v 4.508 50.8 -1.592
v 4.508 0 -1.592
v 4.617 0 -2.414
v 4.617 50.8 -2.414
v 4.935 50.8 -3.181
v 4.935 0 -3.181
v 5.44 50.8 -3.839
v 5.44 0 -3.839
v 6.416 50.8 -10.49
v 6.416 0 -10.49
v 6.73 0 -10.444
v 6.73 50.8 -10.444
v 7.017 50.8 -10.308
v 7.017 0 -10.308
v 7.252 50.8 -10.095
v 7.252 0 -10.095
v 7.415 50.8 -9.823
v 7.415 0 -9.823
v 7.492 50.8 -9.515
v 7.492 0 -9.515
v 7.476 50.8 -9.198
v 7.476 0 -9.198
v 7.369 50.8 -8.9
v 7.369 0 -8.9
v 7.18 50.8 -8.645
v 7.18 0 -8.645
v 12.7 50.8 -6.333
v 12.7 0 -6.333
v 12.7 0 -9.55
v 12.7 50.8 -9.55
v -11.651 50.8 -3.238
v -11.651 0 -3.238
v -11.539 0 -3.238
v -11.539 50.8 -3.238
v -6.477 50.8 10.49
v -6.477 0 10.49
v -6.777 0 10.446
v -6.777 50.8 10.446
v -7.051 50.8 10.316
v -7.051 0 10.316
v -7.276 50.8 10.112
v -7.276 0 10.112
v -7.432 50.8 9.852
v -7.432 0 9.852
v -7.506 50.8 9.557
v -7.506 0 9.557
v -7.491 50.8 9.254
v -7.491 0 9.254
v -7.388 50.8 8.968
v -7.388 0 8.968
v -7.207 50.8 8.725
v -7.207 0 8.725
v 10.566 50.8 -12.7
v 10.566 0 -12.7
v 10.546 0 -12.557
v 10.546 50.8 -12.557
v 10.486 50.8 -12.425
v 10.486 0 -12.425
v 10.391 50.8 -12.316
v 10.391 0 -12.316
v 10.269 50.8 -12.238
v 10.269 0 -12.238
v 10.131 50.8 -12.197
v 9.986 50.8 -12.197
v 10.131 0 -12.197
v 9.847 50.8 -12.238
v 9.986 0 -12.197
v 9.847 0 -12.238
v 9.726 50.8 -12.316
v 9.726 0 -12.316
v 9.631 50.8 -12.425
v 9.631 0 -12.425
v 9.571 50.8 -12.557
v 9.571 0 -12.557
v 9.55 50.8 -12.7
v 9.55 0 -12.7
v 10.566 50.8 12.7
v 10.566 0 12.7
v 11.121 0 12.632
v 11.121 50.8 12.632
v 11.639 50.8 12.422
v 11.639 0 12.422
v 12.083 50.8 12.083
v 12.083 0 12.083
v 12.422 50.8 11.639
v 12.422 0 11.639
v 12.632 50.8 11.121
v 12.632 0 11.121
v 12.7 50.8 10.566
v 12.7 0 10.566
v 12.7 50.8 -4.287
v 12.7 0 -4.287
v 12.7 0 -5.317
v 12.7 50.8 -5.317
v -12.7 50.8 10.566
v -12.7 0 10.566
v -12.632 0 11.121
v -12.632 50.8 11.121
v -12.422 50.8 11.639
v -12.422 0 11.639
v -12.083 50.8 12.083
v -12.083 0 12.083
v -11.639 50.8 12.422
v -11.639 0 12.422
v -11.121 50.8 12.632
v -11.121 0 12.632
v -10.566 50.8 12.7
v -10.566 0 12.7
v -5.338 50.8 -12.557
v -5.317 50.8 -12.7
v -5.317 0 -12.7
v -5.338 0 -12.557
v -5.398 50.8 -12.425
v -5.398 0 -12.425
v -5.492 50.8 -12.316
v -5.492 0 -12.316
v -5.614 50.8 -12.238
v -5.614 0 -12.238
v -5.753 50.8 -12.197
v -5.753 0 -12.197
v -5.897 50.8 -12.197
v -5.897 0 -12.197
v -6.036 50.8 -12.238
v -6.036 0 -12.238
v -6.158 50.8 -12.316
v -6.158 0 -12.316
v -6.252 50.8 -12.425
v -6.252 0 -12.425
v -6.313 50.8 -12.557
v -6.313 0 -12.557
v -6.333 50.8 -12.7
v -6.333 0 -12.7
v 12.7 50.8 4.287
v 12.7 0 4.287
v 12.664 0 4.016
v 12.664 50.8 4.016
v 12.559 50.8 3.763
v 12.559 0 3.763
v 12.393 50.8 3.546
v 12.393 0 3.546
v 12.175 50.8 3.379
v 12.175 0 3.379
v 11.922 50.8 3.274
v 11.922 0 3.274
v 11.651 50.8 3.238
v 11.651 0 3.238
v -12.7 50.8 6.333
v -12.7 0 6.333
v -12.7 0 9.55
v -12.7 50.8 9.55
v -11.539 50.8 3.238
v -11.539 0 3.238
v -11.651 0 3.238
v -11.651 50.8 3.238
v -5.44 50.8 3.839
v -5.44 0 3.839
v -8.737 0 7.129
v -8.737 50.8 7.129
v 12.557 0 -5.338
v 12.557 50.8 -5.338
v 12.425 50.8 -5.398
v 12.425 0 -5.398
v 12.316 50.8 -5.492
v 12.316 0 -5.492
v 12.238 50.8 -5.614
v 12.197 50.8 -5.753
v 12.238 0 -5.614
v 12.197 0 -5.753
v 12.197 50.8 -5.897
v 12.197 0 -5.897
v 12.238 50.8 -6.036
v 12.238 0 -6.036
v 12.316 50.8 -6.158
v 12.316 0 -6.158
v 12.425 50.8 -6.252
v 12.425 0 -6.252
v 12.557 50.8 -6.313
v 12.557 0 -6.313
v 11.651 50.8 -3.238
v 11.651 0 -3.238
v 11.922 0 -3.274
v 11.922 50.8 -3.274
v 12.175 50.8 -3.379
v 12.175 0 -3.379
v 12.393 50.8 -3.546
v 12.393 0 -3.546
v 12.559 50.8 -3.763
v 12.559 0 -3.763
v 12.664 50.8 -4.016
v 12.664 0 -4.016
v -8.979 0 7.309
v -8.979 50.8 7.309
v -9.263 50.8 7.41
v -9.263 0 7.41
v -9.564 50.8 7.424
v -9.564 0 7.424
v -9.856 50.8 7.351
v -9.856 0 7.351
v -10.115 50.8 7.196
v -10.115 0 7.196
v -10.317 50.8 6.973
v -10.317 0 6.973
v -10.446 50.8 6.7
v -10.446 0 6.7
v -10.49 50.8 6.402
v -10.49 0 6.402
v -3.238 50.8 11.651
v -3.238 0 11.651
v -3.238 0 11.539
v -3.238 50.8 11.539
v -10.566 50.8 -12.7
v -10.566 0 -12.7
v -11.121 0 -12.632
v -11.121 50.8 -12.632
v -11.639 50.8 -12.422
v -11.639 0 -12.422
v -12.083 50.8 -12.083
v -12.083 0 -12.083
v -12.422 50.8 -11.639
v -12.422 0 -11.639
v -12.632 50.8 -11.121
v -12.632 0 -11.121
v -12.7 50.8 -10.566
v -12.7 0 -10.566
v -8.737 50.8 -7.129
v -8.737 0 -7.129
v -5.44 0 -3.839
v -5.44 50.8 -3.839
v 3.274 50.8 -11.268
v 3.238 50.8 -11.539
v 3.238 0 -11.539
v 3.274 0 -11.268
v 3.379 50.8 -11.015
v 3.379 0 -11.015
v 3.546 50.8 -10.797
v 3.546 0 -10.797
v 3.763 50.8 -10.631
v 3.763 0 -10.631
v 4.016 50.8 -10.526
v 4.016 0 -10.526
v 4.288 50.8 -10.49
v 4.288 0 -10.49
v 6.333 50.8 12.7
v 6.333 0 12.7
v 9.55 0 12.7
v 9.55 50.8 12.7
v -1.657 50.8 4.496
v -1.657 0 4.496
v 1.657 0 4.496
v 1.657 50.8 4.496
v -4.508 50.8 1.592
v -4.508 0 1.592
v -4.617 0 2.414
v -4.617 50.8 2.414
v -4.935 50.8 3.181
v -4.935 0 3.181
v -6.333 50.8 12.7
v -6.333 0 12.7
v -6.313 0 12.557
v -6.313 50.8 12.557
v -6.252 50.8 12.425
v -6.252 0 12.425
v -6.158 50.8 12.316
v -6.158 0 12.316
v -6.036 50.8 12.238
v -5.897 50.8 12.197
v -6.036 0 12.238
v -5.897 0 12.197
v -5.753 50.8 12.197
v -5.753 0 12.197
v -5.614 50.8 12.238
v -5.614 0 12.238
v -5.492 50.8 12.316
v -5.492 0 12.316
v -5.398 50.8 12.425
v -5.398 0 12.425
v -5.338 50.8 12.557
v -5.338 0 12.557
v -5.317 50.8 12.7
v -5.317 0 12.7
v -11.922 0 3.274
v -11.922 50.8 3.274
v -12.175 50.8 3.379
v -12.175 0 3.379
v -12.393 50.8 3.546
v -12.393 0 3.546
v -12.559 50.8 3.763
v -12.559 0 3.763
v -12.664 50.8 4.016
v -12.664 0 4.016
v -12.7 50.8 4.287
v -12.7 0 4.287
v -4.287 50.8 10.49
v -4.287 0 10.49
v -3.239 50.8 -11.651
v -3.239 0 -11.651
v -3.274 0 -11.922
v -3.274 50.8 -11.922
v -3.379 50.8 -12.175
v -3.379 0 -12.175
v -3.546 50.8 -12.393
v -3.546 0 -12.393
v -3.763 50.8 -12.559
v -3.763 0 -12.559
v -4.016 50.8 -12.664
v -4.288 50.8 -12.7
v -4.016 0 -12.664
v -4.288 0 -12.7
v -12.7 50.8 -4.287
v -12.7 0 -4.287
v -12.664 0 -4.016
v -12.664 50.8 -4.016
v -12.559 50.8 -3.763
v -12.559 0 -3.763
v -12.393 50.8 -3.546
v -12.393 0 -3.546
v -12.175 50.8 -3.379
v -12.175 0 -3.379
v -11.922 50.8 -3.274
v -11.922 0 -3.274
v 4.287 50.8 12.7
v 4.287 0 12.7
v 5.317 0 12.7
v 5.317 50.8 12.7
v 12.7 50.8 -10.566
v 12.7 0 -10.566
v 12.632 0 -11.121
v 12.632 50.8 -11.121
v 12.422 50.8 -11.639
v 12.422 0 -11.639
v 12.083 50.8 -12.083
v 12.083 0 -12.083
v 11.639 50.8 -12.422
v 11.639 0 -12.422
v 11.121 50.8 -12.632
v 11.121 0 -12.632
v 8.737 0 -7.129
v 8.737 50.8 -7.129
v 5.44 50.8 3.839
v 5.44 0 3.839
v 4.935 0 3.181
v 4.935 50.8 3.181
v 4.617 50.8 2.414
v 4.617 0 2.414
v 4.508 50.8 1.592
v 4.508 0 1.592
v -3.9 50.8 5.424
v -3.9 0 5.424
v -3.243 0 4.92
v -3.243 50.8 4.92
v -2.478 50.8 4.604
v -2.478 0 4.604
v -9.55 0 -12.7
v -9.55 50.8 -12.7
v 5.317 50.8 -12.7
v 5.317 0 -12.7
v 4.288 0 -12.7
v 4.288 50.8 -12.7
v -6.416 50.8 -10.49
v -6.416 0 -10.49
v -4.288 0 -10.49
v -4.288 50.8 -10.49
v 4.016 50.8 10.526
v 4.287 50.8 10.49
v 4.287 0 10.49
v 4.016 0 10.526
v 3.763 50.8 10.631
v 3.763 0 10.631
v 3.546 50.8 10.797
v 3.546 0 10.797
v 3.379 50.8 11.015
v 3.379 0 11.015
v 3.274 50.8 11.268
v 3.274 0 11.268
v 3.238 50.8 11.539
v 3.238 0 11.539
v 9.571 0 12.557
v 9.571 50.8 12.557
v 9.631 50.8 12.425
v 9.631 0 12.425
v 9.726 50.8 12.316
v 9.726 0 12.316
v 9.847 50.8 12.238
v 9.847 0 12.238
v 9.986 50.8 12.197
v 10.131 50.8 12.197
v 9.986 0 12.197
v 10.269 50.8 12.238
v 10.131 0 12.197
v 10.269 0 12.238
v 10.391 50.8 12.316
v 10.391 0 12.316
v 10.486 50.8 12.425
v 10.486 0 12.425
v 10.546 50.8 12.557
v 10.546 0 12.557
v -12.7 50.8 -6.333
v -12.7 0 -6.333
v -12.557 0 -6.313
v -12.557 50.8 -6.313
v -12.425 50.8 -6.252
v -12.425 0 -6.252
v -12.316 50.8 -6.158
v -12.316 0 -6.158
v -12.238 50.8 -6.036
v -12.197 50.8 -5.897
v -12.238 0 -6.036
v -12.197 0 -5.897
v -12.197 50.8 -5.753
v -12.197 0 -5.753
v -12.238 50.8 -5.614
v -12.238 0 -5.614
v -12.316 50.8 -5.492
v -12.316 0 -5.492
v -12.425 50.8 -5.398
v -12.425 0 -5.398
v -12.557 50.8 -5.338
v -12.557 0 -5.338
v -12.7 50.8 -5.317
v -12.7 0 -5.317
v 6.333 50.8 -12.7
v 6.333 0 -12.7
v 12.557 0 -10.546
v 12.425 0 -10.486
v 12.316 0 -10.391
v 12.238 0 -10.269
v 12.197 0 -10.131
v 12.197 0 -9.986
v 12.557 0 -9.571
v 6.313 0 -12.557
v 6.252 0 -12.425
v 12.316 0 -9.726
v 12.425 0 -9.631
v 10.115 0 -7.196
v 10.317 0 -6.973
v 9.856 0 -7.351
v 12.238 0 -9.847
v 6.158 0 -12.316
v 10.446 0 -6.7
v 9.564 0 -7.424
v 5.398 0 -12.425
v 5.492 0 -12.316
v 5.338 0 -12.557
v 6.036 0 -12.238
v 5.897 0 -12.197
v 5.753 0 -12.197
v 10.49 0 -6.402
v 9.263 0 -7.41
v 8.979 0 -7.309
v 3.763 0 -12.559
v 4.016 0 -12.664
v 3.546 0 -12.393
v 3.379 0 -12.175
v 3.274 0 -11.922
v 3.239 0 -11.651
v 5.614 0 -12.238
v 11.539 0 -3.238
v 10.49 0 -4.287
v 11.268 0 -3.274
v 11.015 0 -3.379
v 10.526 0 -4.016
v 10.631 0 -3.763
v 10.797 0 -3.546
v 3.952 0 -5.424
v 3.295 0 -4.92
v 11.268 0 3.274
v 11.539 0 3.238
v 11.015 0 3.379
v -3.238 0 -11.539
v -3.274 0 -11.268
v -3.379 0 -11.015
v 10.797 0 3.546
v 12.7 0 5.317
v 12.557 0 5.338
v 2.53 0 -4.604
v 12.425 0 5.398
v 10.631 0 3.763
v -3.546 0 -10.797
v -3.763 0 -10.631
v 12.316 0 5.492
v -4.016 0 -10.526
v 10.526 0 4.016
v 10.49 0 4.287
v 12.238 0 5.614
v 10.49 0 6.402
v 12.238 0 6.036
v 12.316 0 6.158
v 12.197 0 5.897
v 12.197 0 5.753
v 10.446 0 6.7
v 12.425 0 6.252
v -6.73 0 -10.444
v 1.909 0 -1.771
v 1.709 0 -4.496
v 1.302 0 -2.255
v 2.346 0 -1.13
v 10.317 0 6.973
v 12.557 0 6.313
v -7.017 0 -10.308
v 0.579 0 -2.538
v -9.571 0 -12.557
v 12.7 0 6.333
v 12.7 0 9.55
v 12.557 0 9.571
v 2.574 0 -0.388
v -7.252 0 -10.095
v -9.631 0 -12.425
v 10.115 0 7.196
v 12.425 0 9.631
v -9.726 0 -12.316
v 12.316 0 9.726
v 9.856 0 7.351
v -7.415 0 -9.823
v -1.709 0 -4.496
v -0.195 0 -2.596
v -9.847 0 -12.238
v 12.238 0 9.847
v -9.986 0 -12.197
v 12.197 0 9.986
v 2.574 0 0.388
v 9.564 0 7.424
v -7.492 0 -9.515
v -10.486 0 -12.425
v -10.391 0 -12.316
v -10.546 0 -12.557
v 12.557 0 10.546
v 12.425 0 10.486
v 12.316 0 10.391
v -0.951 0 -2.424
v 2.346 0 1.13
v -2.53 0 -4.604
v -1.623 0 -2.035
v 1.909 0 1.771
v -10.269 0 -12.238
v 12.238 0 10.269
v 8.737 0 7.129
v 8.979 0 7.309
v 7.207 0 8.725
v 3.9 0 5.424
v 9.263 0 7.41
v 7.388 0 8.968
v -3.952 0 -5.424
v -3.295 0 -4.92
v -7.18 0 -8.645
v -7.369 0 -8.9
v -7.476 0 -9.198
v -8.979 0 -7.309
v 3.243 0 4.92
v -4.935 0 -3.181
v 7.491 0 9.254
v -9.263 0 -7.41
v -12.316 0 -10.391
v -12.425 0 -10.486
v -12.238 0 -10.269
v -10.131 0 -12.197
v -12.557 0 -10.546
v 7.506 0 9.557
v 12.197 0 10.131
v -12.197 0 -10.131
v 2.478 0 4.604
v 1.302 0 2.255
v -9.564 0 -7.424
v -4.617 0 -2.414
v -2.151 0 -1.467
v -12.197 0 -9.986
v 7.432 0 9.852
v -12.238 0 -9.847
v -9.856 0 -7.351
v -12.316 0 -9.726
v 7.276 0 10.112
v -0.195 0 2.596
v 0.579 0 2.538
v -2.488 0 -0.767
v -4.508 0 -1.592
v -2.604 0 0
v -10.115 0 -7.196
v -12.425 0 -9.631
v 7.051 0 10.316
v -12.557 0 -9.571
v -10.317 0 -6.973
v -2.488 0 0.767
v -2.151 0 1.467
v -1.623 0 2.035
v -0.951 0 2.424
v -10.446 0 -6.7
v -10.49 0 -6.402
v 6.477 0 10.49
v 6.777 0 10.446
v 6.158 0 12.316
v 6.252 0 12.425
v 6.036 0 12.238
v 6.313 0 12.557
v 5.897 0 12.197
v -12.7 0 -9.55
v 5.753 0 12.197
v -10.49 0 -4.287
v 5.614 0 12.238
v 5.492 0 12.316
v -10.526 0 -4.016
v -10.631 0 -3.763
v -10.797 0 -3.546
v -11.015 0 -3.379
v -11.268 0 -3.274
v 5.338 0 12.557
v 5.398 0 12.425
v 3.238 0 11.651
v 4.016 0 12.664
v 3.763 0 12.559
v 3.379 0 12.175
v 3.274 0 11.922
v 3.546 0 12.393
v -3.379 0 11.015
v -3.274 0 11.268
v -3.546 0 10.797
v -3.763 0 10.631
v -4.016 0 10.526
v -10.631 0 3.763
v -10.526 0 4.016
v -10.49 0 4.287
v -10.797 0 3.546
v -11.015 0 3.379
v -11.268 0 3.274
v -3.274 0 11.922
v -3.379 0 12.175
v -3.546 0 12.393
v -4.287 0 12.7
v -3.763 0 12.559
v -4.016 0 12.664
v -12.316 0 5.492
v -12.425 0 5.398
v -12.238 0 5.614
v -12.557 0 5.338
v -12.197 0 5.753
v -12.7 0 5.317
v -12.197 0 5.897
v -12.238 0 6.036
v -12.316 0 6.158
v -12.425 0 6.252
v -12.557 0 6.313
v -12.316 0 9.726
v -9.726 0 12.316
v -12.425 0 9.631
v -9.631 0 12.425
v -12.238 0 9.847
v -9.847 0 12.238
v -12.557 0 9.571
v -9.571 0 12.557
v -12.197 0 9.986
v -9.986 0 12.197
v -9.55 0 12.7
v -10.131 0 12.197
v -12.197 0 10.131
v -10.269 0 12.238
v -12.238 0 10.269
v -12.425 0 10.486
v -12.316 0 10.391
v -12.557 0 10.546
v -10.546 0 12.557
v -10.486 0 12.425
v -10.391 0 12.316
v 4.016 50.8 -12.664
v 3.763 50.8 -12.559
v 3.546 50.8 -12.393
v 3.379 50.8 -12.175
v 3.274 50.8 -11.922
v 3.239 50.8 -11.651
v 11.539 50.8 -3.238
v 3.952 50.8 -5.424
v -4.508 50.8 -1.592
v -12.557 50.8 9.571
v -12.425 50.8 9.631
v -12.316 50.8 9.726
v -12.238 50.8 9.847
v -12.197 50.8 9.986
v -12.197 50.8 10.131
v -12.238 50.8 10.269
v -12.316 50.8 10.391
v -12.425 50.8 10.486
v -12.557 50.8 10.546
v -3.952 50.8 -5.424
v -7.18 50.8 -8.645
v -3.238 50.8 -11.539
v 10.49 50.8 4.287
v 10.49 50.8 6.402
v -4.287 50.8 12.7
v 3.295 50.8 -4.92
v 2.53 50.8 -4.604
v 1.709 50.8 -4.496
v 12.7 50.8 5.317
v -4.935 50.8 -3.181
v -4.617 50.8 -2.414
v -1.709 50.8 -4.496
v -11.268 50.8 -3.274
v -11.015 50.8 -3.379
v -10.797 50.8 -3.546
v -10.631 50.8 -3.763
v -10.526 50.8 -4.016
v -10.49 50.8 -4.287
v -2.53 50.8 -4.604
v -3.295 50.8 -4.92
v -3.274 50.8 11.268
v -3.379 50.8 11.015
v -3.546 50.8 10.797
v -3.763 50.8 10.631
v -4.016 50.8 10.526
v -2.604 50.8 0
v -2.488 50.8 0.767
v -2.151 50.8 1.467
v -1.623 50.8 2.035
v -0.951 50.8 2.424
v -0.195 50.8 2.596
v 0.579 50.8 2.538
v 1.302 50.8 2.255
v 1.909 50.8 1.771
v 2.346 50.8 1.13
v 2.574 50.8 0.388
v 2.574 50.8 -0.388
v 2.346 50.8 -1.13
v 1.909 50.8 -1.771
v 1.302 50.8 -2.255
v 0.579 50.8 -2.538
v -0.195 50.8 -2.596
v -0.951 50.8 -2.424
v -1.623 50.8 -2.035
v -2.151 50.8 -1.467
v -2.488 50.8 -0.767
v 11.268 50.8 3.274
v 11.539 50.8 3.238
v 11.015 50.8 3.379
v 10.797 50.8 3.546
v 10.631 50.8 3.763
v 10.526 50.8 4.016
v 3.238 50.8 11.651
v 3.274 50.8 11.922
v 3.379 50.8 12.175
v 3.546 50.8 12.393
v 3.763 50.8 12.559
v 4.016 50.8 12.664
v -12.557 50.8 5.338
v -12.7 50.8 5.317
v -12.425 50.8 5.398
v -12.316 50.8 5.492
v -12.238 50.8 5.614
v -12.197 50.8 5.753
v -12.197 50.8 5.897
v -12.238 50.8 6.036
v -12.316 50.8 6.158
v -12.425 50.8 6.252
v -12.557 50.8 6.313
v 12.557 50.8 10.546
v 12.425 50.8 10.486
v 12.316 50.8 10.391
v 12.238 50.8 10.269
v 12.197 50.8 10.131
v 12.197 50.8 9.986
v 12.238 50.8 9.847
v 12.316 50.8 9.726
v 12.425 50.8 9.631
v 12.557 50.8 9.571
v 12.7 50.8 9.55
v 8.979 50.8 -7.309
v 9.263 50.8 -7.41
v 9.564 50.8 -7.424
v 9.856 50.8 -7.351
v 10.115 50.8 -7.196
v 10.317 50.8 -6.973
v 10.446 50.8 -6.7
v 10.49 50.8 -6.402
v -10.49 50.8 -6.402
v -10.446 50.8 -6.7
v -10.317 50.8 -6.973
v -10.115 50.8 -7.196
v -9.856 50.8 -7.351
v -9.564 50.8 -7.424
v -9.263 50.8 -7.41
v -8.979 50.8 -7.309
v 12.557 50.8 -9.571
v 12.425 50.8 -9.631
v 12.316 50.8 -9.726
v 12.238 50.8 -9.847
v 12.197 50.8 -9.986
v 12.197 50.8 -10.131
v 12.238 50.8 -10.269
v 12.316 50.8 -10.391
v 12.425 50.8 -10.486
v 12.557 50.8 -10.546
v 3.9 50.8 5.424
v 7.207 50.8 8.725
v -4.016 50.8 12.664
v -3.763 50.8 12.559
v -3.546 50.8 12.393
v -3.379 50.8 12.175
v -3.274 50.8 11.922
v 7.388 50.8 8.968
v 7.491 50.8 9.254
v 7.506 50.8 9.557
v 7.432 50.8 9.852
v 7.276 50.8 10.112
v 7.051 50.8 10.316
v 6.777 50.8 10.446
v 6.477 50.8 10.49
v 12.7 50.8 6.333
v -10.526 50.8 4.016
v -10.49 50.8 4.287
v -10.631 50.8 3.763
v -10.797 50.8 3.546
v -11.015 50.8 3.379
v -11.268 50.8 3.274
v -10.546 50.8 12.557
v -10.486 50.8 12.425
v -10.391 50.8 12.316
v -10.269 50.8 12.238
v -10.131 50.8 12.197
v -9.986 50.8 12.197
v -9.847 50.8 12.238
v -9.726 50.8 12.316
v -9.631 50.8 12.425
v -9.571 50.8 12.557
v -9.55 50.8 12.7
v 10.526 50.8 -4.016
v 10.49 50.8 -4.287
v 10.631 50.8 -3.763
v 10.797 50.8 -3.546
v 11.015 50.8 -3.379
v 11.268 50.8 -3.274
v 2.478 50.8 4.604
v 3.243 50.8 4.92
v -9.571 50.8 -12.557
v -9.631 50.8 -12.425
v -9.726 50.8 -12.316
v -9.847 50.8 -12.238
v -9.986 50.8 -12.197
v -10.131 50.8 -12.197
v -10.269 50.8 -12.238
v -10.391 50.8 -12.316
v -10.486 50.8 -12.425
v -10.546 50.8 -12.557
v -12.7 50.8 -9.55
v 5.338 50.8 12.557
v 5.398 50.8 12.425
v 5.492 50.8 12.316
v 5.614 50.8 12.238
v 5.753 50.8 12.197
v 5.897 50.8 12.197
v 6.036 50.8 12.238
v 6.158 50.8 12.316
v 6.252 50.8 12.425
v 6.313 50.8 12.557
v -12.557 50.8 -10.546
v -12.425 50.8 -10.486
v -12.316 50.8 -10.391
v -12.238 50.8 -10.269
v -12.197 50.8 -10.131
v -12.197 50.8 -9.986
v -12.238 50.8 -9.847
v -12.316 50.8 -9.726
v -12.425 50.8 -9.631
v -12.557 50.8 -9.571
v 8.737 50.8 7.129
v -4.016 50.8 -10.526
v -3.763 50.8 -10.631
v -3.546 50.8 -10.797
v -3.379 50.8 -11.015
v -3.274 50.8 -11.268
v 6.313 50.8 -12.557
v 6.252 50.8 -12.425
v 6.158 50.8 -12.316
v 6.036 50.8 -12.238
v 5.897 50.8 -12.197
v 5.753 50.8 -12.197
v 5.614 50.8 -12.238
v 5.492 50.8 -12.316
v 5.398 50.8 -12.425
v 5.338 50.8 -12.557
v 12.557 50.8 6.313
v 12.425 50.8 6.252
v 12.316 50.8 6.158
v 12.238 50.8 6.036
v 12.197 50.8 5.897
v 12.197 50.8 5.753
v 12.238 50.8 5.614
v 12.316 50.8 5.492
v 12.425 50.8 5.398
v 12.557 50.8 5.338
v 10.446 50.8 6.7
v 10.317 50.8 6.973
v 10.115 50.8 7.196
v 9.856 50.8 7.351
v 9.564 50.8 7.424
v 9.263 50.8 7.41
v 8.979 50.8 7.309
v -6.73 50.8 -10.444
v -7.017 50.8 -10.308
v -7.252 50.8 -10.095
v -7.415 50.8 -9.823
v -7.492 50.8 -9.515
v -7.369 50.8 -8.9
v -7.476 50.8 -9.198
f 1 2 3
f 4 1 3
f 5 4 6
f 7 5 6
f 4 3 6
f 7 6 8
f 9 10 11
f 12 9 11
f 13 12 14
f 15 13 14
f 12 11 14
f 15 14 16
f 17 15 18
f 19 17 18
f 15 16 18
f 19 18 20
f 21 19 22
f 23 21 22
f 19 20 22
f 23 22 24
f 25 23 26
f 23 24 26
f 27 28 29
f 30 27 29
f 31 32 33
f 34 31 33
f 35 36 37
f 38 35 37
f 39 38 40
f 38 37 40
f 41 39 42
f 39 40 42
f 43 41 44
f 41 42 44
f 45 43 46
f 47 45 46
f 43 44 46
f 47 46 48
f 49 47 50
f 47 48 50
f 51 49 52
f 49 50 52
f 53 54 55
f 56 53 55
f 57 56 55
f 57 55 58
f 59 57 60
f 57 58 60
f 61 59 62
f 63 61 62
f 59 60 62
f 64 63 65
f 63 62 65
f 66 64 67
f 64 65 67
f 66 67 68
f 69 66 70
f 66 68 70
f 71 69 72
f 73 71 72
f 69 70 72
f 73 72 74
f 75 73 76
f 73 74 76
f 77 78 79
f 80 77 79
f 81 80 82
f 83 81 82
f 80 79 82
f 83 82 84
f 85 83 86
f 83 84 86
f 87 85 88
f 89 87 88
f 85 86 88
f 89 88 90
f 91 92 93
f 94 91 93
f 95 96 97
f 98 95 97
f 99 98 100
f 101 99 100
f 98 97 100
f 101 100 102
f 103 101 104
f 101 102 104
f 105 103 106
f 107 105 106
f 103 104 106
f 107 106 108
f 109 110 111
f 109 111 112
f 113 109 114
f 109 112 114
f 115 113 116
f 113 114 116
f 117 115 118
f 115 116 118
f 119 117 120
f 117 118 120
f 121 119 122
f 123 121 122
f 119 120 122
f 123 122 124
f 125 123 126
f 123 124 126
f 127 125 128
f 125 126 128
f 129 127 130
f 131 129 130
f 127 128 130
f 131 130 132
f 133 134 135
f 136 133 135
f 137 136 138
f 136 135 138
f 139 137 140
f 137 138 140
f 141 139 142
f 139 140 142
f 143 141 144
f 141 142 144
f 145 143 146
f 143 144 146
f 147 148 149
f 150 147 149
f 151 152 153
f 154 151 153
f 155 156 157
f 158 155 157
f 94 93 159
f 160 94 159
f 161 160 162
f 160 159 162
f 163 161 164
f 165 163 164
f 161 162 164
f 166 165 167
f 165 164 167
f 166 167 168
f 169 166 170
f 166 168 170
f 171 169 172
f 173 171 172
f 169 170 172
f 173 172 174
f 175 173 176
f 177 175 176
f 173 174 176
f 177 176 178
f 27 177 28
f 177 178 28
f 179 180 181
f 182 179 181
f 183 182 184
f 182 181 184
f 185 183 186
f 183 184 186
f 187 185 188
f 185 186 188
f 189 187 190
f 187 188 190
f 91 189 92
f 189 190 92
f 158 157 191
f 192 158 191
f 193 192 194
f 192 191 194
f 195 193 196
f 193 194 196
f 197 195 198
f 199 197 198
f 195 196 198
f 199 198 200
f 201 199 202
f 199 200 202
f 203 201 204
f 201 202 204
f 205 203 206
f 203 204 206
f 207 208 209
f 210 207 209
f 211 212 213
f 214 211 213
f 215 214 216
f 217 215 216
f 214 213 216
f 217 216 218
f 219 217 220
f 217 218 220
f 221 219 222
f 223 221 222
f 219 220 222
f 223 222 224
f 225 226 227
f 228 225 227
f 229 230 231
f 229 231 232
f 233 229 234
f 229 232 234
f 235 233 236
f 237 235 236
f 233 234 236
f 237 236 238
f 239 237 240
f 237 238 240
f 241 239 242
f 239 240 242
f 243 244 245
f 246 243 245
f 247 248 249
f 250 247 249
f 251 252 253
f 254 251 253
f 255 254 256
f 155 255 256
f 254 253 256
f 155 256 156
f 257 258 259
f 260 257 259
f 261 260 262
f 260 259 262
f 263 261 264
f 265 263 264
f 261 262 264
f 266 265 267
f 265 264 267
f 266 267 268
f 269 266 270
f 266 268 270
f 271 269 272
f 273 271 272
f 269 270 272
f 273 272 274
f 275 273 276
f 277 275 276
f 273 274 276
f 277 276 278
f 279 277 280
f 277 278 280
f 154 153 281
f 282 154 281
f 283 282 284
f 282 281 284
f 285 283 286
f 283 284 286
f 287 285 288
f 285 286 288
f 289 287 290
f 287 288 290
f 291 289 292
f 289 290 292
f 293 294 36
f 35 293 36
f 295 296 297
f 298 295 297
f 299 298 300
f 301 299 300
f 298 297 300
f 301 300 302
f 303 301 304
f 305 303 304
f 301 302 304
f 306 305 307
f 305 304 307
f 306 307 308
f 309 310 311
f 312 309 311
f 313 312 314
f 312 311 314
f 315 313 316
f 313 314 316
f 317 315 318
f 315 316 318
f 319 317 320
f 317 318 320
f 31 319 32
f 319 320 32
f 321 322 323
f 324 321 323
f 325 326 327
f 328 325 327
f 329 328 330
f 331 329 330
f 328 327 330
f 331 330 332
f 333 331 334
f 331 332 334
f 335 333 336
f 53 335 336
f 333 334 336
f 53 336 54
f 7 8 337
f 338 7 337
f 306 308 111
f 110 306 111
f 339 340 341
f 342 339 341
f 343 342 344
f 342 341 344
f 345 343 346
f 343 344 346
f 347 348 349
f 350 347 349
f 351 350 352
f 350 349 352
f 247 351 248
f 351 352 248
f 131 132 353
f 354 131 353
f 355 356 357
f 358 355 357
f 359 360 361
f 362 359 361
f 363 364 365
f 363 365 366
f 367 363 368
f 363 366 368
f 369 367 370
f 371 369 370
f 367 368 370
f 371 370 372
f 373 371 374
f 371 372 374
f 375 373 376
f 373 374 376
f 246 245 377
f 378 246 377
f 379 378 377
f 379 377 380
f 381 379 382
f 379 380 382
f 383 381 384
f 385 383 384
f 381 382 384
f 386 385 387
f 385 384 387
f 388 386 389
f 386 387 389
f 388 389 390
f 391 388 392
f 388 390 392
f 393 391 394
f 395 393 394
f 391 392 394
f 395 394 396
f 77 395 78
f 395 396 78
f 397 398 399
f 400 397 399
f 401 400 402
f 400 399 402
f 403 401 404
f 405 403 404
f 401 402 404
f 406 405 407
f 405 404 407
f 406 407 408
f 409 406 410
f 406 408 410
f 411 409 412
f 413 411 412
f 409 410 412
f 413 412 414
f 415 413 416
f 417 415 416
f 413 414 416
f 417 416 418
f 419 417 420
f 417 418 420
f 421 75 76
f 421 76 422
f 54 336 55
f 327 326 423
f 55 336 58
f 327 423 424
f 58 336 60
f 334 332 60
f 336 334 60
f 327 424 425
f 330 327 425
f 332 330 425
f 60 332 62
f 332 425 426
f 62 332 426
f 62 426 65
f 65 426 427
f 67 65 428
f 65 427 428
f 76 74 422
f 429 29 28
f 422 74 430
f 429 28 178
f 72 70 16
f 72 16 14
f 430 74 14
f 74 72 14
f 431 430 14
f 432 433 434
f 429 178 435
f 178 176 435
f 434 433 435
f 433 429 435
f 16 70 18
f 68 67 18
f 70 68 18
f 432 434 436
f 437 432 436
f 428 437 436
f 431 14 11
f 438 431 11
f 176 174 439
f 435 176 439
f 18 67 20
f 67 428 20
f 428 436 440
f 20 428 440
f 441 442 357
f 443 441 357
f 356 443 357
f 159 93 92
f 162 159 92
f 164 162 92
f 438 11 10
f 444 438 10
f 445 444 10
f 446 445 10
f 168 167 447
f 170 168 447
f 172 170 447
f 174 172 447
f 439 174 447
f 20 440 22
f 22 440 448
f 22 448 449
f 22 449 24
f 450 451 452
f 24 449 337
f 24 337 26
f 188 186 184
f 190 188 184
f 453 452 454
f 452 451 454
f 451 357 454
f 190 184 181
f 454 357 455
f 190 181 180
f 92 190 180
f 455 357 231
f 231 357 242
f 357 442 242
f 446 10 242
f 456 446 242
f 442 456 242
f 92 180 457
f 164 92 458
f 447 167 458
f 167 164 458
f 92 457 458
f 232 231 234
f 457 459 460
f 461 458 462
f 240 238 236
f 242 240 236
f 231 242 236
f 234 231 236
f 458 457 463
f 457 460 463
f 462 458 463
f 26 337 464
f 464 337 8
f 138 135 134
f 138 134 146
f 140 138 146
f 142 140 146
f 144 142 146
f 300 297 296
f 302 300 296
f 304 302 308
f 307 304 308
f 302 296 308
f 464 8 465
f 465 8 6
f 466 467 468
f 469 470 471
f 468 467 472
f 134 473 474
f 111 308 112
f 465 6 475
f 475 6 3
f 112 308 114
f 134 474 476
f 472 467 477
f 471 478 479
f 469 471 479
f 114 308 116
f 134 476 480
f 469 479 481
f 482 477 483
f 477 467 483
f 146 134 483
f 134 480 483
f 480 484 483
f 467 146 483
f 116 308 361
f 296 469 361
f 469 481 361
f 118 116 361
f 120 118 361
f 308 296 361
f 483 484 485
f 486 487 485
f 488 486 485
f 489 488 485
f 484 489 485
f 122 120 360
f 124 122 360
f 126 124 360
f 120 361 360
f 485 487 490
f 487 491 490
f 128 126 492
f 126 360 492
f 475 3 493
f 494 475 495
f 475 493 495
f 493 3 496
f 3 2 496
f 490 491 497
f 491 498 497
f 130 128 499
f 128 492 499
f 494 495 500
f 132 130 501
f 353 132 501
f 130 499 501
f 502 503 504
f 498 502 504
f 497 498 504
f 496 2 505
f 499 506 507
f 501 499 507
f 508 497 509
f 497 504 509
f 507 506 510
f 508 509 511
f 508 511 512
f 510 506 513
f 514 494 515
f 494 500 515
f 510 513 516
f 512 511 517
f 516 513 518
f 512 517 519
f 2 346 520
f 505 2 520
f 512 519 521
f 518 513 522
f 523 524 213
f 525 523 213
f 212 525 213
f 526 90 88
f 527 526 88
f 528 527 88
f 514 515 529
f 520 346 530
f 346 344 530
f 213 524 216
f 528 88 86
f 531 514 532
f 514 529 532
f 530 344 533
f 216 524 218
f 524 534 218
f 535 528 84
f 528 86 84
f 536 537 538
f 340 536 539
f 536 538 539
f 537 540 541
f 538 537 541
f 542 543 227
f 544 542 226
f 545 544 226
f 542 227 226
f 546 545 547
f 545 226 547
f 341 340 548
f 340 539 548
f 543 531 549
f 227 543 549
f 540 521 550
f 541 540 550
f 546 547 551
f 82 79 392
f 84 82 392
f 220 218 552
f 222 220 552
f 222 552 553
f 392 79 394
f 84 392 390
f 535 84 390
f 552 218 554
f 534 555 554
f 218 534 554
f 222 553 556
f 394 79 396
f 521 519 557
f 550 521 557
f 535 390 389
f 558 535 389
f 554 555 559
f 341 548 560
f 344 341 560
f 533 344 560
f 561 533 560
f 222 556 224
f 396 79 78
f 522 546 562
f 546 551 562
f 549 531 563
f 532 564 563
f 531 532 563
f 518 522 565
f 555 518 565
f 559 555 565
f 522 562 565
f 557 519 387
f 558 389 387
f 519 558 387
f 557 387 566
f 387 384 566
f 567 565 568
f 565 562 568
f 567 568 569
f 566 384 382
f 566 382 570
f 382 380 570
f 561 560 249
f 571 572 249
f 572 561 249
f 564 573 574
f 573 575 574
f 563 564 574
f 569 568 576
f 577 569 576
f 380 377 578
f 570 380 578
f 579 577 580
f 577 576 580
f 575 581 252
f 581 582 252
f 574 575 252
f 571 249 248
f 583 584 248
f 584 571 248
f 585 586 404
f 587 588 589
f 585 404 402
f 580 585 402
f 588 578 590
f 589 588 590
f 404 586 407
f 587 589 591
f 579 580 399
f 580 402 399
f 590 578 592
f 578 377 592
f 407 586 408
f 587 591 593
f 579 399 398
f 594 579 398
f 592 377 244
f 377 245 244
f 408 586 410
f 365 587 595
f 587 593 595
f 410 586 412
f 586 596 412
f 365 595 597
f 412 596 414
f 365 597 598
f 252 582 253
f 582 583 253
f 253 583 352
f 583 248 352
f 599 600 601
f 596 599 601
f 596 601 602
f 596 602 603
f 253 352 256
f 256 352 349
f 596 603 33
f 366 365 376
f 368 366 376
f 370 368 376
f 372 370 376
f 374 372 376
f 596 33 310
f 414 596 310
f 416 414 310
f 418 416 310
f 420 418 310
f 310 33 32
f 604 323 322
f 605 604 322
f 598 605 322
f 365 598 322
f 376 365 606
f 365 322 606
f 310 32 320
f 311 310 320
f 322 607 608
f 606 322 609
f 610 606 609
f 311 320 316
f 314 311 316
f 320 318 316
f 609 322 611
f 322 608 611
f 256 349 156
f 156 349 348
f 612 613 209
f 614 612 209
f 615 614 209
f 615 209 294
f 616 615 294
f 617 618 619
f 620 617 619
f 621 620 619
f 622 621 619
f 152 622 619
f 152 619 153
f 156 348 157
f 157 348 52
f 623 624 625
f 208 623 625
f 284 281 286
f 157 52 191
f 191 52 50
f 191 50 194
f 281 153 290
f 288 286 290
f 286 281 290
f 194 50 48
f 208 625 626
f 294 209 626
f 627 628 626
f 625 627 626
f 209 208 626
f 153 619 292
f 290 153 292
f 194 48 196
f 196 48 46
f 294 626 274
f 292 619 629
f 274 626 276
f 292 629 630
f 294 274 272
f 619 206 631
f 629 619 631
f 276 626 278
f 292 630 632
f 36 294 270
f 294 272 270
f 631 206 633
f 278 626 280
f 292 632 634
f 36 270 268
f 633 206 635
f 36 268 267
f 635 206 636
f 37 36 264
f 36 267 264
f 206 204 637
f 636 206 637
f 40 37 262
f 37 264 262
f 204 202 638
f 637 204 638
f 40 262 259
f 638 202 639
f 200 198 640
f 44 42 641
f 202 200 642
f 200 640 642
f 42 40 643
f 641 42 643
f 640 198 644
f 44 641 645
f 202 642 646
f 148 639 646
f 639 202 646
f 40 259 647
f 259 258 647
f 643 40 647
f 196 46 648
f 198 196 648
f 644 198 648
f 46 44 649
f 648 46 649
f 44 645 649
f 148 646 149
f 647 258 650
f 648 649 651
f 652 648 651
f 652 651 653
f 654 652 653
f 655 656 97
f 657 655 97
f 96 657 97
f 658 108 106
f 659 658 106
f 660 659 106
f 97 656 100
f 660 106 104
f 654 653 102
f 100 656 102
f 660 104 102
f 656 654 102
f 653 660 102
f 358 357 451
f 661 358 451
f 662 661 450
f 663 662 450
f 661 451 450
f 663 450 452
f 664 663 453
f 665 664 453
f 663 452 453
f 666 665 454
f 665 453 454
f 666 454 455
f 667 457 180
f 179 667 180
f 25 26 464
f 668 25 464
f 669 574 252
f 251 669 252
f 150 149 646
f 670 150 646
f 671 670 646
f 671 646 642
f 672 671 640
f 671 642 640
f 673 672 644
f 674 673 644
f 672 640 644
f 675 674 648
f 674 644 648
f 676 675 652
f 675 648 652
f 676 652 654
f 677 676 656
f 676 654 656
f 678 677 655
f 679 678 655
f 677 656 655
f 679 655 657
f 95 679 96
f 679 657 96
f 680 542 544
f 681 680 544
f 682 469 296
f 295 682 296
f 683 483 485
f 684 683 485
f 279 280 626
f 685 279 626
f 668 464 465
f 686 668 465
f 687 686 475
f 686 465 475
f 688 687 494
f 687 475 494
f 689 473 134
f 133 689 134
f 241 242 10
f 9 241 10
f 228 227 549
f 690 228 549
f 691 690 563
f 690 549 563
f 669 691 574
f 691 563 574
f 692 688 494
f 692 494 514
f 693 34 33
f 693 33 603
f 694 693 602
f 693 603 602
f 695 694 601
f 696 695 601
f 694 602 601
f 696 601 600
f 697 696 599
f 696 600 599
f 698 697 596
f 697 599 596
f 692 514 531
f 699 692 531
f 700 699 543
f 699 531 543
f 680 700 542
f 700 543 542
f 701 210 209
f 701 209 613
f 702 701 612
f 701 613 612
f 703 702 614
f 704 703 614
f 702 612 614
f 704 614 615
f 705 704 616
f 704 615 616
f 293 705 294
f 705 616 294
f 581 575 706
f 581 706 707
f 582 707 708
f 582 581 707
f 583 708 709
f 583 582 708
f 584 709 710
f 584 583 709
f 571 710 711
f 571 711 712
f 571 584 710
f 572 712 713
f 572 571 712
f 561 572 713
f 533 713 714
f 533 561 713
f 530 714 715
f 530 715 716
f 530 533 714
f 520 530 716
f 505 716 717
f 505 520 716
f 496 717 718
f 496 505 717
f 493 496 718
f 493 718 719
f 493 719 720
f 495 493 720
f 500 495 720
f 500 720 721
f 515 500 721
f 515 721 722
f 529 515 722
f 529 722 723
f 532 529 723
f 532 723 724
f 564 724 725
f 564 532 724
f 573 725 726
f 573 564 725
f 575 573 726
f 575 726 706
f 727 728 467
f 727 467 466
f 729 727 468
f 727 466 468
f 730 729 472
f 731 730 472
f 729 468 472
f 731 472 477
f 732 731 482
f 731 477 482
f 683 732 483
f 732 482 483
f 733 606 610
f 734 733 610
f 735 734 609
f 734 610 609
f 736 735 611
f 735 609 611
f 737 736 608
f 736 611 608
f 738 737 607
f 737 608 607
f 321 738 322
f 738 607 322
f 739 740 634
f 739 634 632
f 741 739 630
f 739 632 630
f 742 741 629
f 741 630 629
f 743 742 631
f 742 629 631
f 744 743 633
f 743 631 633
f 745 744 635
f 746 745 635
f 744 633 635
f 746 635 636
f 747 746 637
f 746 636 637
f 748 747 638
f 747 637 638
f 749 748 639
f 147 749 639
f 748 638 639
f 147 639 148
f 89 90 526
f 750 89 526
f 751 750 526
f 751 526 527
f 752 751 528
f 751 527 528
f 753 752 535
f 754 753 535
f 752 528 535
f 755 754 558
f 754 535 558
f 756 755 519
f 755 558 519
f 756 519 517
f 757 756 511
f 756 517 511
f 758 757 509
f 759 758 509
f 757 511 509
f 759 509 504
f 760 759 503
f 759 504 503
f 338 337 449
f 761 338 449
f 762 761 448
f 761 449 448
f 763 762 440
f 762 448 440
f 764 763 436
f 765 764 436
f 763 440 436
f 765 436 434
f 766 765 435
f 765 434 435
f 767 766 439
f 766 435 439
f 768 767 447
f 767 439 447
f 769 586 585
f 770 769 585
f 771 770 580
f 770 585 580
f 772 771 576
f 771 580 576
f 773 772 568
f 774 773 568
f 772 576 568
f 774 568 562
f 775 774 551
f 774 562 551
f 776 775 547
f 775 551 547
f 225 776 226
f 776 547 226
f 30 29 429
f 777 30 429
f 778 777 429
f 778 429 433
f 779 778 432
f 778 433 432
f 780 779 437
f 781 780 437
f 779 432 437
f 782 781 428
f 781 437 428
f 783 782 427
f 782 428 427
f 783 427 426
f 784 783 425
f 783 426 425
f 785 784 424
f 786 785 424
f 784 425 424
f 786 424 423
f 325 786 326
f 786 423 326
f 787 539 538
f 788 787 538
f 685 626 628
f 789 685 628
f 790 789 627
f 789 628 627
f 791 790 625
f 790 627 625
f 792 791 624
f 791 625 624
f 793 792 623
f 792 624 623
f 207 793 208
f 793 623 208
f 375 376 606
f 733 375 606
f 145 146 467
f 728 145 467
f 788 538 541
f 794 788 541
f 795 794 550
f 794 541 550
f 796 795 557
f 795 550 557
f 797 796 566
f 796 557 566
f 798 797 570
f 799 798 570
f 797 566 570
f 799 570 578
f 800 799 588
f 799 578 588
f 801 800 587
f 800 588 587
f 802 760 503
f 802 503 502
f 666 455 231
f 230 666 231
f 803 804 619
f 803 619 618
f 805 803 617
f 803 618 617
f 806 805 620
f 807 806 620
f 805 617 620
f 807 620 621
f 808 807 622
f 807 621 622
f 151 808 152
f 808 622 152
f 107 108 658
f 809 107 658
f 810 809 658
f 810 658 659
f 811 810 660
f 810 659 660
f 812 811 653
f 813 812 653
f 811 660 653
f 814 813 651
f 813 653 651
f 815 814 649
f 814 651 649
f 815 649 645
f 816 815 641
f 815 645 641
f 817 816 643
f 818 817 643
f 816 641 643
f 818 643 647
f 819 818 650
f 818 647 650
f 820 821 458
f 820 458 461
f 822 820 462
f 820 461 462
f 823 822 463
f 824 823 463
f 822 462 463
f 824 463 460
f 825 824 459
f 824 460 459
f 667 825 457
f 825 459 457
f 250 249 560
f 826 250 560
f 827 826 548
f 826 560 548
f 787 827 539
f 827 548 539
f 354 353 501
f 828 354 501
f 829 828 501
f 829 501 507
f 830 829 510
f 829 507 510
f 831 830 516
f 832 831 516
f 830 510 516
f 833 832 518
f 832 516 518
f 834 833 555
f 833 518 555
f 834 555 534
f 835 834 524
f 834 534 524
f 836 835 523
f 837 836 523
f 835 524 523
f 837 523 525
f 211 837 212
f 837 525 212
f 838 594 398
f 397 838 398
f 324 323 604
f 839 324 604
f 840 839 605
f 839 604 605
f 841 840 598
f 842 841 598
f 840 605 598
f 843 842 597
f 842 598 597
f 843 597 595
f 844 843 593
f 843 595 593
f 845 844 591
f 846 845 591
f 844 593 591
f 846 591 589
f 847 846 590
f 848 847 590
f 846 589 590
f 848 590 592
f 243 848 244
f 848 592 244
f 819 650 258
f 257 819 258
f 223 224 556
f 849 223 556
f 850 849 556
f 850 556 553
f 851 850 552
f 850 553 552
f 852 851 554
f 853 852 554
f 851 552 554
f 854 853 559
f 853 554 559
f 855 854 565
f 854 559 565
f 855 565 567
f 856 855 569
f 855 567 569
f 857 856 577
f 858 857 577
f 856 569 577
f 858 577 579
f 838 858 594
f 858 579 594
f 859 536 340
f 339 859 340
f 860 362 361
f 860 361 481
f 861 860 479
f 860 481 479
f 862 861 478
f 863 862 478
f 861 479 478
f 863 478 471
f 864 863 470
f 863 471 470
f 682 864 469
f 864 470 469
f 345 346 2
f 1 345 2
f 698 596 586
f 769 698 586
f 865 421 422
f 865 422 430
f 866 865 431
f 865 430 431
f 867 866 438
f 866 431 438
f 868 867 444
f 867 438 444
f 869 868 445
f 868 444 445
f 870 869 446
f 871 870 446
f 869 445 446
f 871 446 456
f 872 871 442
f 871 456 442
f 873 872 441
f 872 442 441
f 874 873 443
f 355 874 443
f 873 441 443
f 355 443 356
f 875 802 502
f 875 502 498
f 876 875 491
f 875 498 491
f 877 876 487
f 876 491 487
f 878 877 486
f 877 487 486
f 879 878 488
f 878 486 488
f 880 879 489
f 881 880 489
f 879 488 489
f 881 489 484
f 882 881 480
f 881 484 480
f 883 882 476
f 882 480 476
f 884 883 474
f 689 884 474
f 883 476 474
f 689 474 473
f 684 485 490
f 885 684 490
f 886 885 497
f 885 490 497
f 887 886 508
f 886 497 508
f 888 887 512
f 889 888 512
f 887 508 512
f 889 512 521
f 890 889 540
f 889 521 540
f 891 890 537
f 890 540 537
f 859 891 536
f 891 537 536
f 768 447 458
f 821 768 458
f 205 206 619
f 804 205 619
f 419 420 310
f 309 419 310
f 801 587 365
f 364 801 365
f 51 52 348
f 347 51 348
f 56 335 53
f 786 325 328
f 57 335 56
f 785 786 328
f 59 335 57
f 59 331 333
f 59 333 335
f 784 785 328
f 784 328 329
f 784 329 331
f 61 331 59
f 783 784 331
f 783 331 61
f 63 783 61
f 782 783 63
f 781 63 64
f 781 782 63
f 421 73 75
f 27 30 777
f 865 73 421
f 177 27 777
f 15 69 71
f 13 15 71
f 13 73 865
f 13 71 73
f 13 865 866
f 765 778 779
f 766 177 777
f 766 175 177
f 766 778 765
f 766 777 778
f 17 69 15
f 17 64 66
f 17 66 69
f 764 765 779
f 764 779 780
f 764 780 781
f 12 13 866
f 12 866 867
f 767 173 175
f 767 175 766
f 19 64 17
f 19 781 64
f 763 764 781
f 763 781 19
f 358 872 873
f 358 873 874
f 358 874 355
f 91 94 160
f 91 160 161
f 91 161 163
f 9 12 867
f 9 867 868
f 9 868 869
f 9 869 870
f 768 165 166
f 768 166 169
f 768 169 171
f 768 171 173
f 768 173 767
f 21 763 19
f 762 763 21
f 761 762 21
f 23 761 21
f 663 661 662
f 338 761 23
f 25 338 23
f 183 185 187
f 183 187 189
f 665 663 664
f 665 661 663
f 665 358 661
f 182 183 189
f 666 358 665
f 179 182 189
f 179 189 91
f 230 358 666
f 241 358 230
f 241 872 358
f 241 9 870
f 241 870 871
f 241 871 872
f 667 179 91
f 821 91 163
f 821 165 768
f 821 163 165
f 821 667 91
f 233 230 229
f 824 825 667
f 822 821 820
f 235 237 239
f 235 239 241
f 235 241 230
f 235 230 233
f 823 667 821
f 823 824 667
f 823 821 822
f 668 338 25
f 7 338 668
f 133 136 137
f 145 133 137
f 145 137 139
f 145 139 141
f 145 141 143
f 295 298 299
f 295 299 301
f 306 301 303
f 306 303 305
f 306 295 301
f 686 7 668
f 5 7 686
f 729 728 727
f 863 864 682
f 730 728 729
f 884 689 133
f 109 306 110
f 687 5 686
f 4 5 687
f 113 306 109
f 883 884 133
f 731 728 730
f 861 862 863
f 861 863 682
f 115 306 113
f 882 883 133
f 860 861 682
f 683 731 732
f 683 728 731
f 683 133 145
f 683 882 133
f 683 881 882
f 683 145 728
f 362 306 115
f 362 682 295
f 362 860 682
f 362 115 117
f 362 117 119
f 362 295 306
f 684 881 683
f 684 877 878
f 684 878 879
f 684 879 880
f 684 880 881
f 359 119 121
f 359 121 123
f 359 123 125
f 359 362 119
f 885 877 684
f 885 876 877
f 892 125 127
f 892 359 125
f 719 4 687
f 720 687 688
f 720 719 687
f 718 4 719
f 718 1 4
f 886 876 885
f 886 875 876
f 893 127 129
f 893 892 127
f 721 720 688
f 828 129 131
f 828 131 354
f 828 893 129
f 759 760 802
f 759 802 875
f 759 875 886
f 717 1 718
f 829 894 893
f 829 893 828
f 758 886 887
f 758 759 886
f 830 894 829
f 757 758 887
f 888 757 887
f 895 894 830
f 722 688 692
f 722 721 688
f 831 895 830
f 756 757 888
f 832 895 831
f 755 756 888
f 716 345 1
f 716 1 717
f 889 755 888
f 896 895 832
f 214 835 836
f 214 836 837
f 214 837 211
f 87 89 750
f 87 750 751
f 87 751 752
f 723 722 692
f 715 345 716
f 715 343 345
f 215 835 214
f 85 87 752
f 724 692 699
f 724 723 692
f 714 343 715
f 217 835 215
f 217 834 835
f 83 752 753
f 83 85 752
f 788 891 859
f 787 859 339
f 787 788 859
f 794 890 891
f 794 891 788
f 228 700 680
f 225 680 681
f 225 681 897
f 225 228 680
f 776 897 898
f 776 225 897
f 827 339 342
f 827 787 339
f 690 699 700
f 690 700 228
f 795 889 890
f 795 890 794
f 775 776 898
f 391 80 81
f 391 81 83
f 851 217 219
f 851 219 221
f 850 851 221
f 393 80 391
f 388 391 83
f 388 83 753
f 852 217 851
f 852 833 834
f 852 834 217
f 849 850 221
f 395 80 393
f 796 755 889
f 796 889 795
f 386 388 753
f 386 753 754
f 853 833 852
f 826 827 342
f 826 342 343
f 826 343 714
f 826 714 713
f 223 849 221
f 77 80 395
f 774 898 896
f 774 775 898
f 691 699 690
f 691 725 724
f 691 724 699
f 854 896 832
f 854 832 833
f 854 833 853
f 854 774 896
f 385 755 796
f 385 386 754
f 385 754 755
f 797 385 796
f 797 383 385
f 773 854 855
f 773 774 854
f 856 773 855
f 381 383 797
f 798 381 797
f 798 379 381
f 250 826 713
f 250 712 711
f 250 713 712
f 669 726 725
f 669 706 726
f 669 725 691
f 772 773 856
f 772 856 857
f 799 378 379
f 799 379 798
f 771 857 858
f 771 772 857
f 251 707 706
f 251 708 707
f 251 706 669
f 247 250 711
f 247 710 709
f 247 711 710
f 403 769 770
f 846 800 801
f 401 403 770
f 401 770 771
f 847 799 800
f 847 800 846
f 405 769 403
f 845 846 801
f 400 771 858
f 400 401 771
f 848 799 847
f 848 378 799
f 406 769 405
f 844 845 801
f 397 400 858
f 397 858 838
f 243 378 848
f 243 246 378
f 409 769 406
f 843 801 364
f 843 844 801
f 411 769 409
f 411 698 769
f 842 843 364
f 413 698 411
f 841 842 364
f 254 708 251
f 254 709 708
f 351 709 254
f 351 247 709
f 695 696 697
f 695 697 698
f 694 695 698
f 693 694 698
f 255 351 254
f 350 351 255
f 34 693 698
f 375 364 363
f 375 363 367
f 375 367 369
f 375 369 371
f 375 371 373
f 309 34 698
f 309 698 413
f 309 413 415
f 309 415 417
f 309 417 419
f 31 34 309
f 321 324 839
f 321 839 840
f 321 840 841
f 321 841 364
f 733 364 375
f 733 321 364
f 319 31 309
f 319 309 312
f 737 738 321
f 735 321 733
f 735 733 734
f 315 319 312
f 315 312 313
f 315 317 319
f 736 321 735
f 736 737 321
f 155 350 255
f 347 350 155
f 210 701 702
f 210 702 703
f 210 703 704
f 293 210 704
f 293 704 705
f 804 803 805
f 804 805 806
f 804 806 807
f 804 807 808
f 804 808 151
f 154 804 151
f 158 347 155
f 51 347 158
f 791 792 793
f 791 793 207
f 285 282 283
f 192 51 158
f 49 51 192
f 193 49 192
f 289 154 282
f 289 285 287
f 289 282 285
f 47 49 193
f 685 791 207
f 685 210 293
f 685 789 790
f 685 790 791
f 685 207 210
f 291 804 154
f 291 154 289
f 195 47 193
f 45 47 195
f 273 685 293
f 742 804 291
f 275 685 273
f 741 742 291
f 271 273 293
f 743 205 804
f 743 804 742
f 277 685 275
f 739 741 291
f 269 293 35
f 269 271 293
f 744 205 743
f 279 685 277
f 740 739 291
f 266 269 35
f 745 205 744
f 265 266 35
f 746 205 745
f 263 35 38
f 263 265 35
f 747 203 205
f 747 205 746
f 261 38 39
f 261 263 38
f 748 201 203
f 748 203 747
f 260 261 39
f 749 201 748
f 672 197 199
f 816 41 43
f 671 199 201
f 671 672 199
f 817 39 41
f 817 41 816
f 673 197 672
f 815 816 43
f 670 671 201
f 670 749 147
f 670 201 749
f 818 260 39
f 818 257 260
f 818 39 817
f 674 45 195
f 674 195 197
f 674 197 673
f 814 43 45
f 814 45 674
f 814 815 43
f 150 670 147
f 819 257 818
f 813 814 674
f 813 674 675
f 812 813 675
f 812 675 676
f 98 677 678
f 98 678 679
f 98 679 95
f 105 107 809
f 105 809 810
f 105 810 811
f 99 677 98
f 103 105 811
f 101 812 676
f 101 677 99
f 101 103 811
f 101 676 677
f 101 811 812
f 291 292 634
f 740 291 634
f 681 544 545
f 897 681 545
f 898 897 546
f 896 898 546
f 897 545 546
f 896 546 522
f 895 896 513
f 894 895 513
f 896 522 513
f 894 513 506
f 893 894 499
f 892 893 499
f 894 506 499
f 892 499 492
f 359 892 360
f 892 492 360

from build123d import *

# Parameters (mm, degrees)
SKETCH12_R                = 2.6035
F_10_1010_PROFILE_1_DEPTH = 50.8


with BuildPart() as part:
    # Sketch12 → 10 1010 PROFILE(1) (new body)
    with BuildSketch(Plane(origin=(0, 0, 0), x_dir=(-1, 0, 0), z_dir=(0, 1, 0))):
        with BuildLine():
            Line((-1.709253557, -4.4958), (1.709253557, -4.4958))
            ThreePointArc((1.709253557, -4.4958), (2.922935876, -4.736928798), (3.95226937, -5.423689619))
            Line((3.95226937, -5.423689619), (7.179652728, -8.645192207))
            ThreePointArc((7.179652728, -8.645192207), (7.414733441, -9.822812921), (6.41641086, -10.4902))
            Line((6.41641086, -10.4902), (4.28752, -10.4902))
            ThreePointArc((4.28752, -10.4902), (3.545750844, -10.797450844), (3.2385, -11.53922))
            Line((3.2385, -11.53922), (3.2385, -11.65098))
            ThreePointArc((3.2385, -11.65098), (3.545750844, -12.392749156), (4.28752, -12.7))
            Line((4.28752, -12.7), (5.3171344, -12.7))
            ThreePointArc((5.3171344, -12.7), (5.8251344, -12.192), (6.3331344, -12.7))
            Line((6.3331344, -12.7), (9.5504, -12.7))
            ThreePointArc((9.5504, -12.7), (10.058323491, -12.192000006), (10.566399977, -12.699846982))
            ThreePointArc((10.566399977, -12.699846982), (12.082522516, -12.082522516), (12.699846982, -10.566399977))
            ThreePointArc((12.699846982, -10.566399977), (12.192000006, -10.058323491), (12.7, -9.5504))
            Line((12.7, -9.5504), (12.7, -6.3330836))
            ThreePointArc((12.7, -6.3330836), (12.192, -5.8250836), (12.7, -5.3170836))
            Line((12.7, -5.3170836), (12.7, -4.287470133))
            ThreePointArc((12.7, -4.287470133), (12.392749156, -3.545700977), (11.65098, -3.238450133))
            Line((11.65098, -3.238450133), (11.53922, -3.238450133))
            ThreePointArc((11.53922, -3.238450133), (10.797450844, -3.545700977), (10.4902, -4.287470133))
            Line((10.4902, -4.287470133), (10.4902, -6.402089023))
            ThreePointArc((10.4902, -6.402089023), (9.856394933, -7.351113629), (8.736962546, -7.129240479))
            Line((8.736962546, -7.129240479), (5.440484187, -3.838768792))
            ThreePointArc((5.440484187, -3.838768792), (4.75073678, -2.808015636), (4.5085, -1.591658411))
            Line((4.5085, -1.591658411), (4.5085, 1.591658411))
            ThreePointArc((4.5085, 1.591658411), (4.75073678, 2.808015636), (5.440484187, 3.838768792))
            Line((5.440484187, 3.838768792), (8.736962546, 7.129240479))
            ThreePointArc((8.736962546, 7.129240479), (9.856394933, 7.351113629), (10.4902, 6.402089023))
            Line((10.4902, 6.402089023), (10.4902, 4.287470133))
            ThreePointArc((10.4902, 4.287470133), (10.797450844, 3.545700977), (11.53922, 3.238450133))
            Line((11.53922, 3.238450133), (11.65098, 3.238450133))
            ThreePointArc((11.65098, 3.238450133), (12.392749156, 3.545700977), (12.7, 4.287470133))
            Line((12.7, 4.287470133), (12.7, 5.3171344))
            ThreePointArc((12.7, 5.3171344), (12.192, 5.8251344), (12.7, 6.3331344))
            Line((12.7, 6.3331344), (12.7, 9.5504))
            ThreePointArc((12.7, 9.5504), (12.192000006, 10.058323491), (12.699846982, 10.566399977))
            ThreePointArc((12.699846982, 10.566399977), (12.082522516, 12.082522516), (10.566399977, 12.699846982))
            ThreePointArc((10.566399977, 12.699846982), (10.058323491, 12.192000006), (9.5504, 12.7))
            Line((9.5504, 12.7), (6.3330836, 12.7))
            ThreePointArc((6.3330836, 12.7), (5.8250836, 12.192), (5.3170836, 12.7))
            Line((5.3170836, 12.7), (4.2874692, 12.7))
            ThreePointArc((4.2874692, 12.7), (3.545700044, 12.392749156), (3.2384492, 11.65098))
            Line((3.2384492, 11.65098), (3.2384492, 11.53922))
            ThreePointArc((3.2384492, 11.53922), (3.545700044, 10.797450844), (4.2874692, 10.4902))
            Line((4.2874692, 10.4902), (6.476774195, 10.4902))
            ThreePointArc((6.476774195, 10.4902), (7.43216212, 9.851515102), (7.207191475, 8.724540082))
            Line((7.207191475, 8.724540082), (3.900315394, 5.423689619))
            ThreePointArc((3.900315394, 5.423689619), (2.8709819, 4.736928798), (1.657299581, 4.4958))
            Line((1.657299581, 4.4958), (-1.657299581, 4.4958))
            ThreePointArc((-1.657299581, 4.4958), (-2.8709819, 4.736928798), (-3.900315394, 5.423689619))
            Line((-3.900315394, 5.423689619), (-7.207191475, 8.724540082))
            ThreePointArc((-7.207191475, 8.724540082), (-7.43216212, 9.851515102), (-6.476774195, 10.4902))
            Line((-6.476774195, 10.4902), (-4.2874692, 10.4902))
            ThreePointArc((-4.2874692, 10.4902), (-3.545700044, 10.797450844), (-3.2384492, 11.53922))
            Line((-3.2384492, 11.53922), (-3.2384492, 11.65098))
            ThreePointArc((-3.2384492, 11.65098), (-3.545700044, 12.392749156), (-4.2874692, 12.7))
            Line((-4.2874692, 12.7), (-5.3170836, 12.7))
            ThreePointArc((-5.3170836, 12.7), (-5.8250836, 12.192), (-6.3330836, 12.7))
            Line((-6.3330836, 12.7), (-9.5504, 12.7))
            ThreePointArc((-9.5504, 12.7), (-10.058323491, 12.192000006), (-10.566399977, 12.699846982))
            ThreePointArc((-10.566399977, 12.699846982), (-12.082522516, 12.082522516), (-12.699846982, 10.566399977))
            ThreePointArc((-12.699846982, 10.566399977), (-12.192000006, 10.058323491), (-12.7, 9.5504))
            Line((-12.7, 9.5504), (-12.7, 6.3331344))
            ThreePointArc((-12.7, 6.3331344), (-12.192, 5.8251344), (-12.7, 5.3171344))
            Line((-12.7, 5.3171344), (-12.7, 4.287470133))
            ThreePointArc((-12.7, 4.287470133), (-12.392749156, 3.545700977), (-11.65098, 3.238450133))
            Line((-11.65098, 3.238450133), (-11.53922, 3.238450133))
            ThreePointArc((-11.53922, 3.238450133), (-10.797450844, 3.545700977), (-10.4902, 4.287470133))
            Line((-10.4902, 4.287470133), (-10.4902, 6.402089023))
            ThreePointArc((-10.4902, 6.402089023), (-9.856394933, 7.351113629), (-8.736962546, 7.129240479))
            Line((-8.736962546, 7.129240479), (-5.440484187, 3.838768792))
            ThreePointArc((-5.440484187, 3.838768792), (-4.75073678, 2.808015636), (-4.5085, 1.591658411))
            Line((-4.5085, 1.591658411), (-4.5085, -1.591658411))
            ThreePointArc((-4.5085, -1.591658411), (-4.75073678, -2.808015636), (-5.440484187, -3.838768792))
            Line((-5.440484187, -3.838768792), (-8.736962546, -7.129240479))
            ThreePointArc((-8.736962546, -7.129240479), (-9.856394933, -7.351113629), (-10.4902, -6.402089023))
            Line((-10.4902, -6.402089023), (-10.4902, -4.287470133))
            ThreePointArc((-10.4902, -4.287470133), (-10.797450844, -3.545700977), (-11.53922, -3.238450133))
            Line((-11.53922, -3.238450133), (-11.65098, -3.238450133))
            ThreePointArc((-11.65098, -3.238450133), (-12.392749156, -3.545700977), (-12.7, -4.287470133))
            Line((-12.7, -4.287470133), (-12.7, -5.3170836))
            ThreePointArc((-12.7, -5.3170836), (-12.192, -5.8250836), (-12.7, -6.3330836))
            Line((-12.7, -6.3330836), (-12.7, -9.5504))
            ThreePointArc((-12.7, -9.5504), (-12.192000006, -10.058323491), (-12.699846982, -10.566399977))
            ThreePointArc((-12.699846982, -10.566399977), (-12.082522516, -12.082522516), (-10.566399977, -12.699846982))
            ThreePointArc((-10.566399977, -12.699846982), (-10.058323491, -12.192000006), (-9.5504, -12.7))
            Line((-9.5504, -12.7), (-6.3331344, -12.7))
            ThreePointArc((-6.3331344, -12.7), (-5.8251344, -12.192), (-5.3171344, -12.7))
            Line((-5.3171344, -12.7), (-4.28752, -12.7))
            ThreePointArc((-4.28752, -12.7), (-3.545750844, -12.392749156), (-3.2385, -11.65098))
            Line((-3.2385, -11.65098), (-3.2385, -11.53922))
            ThreePointArc((-3.2385, -11.53922), (-3.545750844, -10.797450844), (-4.28752, -10.4902))
            Line((-4.28752, -10.4902), (-6.41641086, -10.4902))
            ThreePointArc((-6.41641086, -10.4902), (-7.414733441, -9.822812921), (-7.179652728, -8.645192207))
            Line((-7.179652728, -8.645192207), (-3.95226937, -5.423689619))
            ThreePointArc((-3.95226937, -5.423689619), (-2.922935876, -4.736928798), (-1.709253557, -4.4958))
        make_face()
        Circle(SKETCH12_R, mode=Mode.SUBTRACT)
    extrude(amount=F_10_1010_PROFILE_1_DEPTH)


solid = part.part
